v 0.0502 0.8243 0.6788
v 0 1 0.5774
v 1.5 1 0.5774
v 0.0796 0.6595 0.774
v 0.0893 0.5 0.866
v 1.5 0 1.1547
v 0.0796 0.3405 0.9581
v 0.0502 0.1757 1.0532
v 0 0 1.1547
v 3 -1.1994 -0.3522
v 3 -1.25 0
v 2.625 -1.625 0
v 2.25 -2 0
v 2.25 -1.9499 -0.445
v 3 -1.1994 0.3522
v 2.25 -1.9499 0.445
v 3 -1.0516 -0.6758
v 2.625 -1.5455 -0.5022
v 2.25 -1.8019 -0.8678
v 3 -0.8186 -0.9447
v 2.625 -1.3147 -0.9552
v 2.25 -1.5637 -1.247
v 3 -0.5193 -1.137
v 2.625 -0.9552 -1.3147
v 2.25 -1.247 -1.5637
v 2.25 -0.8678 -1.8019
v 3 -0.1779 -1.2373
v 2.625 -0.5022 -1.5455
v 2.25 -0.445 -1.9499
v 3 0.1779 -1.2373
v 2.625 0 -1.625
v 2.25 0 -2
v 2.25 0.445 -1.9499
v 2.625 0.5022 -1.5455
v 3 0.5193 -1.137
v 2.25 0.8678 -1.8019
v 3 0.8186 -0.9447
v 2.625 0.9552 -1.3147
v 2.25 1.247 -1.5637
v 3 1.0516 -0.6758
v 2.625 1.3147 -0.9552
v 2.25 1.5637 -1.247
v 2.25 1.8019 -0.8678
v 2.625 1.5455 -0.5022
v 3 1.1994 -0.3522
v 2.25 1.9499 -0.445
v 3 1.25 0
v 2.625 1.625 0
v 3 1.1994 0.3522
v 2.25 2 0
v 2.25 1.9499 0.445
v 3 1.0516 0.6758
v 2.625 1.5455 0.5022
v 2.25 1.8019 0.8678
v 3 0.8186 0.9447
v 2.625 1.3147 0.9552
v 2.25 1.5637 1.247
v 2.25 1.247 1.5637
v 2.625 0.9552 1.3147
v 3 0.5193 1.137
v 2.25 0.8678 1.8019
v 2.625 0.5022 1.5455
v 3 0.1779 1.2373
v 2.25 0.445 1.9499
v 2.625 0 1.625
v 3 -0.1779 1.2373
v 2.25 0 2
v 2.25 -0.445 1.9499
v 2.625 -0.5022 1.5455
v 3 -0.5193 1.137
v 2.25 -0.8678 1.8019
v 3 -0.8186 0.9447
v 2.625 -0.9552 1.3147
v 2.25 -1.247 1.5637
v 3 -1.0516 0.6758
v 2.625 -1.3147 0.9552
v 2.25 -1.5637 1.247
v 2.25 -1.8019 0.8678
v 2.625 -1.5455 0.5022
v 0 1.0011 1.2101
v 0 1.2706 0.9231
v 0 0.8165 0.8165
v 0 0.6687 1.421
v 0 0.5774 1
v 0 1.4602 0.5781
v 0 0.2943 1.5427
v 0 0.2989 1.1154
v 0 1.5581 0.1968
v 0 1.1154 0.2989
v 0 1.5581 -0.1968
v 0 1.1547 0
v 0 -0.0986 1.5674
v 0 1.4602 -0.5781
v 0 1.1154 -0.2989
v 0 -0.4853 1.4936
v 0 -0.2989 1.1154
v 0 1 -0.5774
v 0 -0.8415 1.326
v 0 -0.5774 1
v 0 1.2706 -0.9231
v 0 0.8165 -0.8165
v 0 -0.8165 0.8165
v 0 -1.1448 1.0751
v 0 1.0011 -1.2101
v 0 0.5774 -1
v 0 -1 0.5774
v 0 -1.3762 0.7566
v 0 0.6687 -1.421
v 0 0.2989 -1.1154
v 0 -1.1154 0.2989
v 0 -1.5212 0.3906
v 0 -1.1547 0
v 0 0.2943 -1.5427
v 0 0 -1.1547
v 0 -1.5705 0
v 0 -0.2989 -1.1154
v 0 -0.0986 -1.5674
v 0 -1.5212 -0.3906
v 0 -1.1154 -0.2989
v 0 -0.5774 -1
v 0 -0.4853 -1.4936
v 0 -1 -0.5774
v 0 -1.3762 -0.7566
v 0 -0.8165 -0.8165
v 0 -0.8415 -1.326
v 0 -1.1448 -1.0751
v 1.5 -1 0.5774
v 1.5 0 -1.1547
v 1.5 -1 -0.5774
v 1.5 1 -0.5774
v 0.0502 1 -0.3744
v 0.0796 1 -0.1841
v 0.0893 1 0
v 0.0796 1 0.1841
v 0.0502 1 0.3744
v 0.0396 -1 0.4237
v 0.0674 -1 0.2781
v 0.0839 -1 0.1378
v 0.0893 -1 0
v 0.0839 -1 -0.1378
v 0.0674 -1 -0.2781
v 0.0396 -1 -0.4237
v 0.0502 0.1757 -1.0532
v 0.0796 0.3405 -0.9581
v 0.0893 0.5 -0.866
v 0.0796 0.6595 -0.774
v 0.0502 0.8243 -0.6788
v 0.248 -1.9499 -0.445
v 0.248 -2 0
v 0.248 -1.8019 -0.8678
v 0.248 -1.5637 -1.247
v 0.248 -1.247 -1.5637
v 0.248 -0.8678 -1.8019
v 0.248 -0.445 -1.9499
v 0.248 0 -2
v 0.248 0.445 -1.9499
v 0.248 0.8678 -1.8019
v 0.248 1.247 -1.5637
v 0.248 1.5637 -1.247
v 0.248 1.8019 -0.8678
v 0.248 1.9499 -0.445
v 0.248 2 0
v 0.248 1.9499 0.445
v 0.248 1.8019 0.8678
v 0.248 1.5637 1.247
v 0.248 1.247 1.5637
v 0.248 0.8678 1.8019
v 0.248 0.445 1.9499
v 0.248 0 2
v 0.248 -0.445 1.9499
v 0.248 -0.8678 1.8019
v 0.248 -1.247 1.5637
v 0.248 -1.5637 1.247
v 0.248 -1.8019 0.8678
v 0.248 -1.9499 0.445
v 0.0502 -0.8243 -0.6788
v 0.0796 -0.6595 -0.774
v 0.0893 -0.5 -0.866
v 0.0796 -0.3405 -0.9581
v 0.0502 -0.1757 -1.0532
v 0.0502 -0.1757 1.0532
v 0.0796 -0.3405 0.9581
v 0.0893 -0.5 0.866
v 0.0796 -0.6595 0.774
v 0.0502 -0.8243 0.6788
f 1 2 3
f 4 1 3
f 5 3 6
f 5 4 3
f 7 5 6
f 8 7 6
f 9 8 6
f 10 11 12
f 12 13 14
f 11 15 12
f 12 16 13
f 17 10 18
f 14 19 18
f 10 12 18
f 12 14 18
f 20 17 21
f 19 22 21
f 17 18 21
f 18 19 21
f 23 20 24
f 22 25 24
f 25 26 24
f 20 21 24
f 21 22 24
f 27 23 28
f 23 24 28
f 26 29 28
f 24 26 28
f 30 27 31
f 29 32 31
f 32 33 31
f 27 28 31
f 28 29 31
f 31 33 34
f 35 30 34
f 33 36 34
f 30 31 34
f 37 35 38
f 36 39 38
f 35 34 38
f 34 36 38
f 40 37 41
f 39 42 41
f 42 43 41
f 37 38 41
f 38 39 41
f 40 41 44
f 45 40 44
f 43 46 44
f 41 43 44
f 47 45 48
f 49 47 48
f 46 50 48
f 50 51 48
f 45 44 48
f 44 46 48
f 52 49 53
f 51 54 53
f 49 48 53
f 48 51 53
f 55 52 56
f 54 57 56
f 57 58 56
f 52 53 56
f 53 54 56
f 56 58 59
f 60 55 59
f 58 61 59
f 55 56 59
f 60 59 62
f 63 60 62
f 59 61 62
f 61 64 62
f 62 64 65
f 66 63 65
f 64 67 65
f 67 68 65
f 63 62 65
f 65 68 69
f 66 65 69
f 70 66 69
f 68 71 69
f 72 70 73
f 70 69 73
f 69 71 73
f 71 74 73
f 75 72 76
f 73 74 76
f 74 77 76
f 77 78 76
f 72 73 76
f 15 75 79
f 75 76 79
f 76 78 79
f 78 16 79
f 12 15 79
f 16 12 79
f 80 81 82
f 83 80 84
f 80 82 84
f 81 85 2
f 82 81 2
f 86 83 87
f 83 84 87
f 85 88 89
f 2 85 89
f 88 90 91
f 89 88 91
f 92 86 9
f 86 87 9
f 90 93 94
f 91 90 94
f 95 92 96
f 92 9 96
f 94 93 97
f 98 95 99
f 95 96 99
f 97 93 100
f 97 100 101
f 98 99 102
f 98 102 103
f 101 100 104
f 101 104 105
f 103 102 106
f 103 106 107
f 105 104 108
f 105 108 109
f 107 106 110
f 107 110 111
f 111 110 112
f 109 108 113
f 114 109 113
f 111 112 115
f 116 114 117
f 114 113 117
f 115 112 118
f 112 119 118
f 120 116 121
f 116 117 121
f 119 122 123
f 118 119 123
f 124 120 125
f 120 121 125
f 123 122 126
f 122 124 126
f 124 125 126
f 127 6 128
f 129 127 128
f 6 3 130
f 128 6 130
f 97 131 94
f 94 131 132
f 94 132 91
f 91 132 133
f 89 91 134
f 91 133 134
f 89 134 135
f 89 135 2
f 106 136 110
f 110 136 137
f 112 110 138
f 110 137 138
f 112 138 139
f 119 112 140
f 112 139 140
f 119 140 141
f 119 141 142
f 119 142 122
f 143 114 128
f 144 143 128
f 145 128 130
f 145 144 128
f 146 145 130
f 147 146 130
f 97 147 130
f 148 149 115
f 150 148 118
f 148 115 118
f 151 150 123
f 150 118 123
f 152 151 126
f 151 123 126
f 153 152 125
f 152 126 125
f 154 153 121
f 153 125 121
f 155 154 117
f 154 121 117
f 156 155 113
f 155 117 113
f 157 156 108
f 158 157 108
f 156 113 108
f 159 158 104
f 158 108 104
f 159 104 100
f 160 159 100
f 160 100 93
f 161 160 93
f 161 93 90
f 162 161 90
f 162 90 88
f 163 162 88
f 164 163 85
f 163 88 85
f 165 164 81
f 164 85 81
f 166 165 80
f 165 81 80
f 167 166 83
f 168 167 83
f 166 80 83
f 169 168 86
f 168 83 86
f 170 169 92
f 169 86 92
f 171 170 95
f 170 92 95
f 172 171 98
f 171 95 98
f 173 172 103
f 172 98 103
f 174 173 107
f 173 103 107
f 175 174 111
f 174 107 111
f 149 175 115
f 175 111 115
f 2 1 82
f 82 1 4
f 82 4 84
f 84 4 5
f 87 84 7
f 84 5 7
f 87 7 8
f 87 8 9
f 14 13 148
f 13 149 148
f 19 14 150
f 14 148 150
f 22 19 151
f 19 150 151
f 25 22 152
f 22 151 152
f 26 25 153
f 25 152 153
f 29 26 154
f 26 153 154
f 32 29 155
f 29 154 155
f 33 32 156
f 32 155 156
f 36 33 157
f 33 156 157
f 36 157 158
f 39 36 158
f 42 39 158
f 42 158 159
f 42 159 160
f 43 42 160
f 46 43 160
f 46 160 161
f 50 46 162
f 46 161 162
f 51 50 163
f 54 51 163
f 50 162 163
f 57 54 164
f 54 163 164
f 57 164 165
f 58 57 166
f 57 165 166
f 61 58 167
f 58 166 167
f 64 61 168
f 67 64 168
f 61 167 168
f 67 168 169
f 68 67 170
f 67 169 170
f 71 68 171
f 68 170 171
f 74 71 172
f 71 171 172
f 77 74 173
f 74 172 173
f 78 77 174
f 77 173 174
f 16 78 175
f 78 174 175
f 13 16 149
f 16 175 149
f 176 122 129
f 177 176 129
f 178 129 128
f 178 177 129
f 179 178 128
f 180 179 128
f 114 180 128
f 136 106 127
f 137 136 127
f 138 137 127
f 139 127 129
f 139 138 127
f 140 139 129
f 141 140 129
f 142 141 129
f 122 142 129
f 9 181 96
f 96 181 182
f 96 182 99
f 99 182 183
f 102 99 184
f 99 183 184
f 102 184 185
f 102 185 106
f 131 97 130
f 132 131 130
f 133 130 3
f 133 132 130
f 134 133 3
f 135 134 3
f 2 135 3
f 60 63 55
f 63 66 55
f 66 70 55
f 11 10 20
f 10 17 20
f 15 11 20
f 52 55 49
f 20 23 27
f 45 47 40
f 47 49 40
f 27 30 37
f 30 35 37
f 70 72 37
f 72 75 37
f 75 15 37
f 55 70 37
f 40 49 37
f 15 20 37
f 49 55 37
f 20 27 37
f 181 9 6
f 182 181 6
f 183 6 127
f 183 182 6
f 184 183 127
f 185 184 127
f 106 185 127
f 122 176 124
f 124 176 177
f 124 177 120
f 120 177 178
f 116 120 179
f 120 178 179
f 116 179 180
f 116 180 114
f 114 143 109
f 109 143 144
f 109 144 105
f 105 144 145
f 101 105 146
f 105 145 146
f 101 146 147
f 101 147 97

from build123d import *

# Parameters (mm, degrees)
CUT_EXTRUDE1_DEPTH = 1.5


with BuildPart() as part:
    # Sketch1 → Revolve1 (revolve)
    with BuildSketch(Plane.XY):
        Polygon((3, 0), (3, -1.25), (2.25, -2), (0.247971941, -2), (0, -1.5705), (0, -1.154700538), (0.666666667, 0), align=None)
    revolve(axis=Axis((0.666666667, 0, 0), (1, 0, 0)))

    # Sketch2 → Cut-Extrude1 (cut)
    with BuildSketch(Plane(origin=(0, 0, 0), x_dir=(0, 0, -1), z_dir=(1, 0, 0))):
        Polygon((-1.154700538, 0), (-0.577350269, -1), (0.577350269, -1), (1.154700538, 0), (0.577350269, 1), (-0.577350269, 1), align=None)
    extrude(amount=CUT_EXTRUDE1_DEPTH, mode=Mode.SUBTRACT)


solid = part.part
